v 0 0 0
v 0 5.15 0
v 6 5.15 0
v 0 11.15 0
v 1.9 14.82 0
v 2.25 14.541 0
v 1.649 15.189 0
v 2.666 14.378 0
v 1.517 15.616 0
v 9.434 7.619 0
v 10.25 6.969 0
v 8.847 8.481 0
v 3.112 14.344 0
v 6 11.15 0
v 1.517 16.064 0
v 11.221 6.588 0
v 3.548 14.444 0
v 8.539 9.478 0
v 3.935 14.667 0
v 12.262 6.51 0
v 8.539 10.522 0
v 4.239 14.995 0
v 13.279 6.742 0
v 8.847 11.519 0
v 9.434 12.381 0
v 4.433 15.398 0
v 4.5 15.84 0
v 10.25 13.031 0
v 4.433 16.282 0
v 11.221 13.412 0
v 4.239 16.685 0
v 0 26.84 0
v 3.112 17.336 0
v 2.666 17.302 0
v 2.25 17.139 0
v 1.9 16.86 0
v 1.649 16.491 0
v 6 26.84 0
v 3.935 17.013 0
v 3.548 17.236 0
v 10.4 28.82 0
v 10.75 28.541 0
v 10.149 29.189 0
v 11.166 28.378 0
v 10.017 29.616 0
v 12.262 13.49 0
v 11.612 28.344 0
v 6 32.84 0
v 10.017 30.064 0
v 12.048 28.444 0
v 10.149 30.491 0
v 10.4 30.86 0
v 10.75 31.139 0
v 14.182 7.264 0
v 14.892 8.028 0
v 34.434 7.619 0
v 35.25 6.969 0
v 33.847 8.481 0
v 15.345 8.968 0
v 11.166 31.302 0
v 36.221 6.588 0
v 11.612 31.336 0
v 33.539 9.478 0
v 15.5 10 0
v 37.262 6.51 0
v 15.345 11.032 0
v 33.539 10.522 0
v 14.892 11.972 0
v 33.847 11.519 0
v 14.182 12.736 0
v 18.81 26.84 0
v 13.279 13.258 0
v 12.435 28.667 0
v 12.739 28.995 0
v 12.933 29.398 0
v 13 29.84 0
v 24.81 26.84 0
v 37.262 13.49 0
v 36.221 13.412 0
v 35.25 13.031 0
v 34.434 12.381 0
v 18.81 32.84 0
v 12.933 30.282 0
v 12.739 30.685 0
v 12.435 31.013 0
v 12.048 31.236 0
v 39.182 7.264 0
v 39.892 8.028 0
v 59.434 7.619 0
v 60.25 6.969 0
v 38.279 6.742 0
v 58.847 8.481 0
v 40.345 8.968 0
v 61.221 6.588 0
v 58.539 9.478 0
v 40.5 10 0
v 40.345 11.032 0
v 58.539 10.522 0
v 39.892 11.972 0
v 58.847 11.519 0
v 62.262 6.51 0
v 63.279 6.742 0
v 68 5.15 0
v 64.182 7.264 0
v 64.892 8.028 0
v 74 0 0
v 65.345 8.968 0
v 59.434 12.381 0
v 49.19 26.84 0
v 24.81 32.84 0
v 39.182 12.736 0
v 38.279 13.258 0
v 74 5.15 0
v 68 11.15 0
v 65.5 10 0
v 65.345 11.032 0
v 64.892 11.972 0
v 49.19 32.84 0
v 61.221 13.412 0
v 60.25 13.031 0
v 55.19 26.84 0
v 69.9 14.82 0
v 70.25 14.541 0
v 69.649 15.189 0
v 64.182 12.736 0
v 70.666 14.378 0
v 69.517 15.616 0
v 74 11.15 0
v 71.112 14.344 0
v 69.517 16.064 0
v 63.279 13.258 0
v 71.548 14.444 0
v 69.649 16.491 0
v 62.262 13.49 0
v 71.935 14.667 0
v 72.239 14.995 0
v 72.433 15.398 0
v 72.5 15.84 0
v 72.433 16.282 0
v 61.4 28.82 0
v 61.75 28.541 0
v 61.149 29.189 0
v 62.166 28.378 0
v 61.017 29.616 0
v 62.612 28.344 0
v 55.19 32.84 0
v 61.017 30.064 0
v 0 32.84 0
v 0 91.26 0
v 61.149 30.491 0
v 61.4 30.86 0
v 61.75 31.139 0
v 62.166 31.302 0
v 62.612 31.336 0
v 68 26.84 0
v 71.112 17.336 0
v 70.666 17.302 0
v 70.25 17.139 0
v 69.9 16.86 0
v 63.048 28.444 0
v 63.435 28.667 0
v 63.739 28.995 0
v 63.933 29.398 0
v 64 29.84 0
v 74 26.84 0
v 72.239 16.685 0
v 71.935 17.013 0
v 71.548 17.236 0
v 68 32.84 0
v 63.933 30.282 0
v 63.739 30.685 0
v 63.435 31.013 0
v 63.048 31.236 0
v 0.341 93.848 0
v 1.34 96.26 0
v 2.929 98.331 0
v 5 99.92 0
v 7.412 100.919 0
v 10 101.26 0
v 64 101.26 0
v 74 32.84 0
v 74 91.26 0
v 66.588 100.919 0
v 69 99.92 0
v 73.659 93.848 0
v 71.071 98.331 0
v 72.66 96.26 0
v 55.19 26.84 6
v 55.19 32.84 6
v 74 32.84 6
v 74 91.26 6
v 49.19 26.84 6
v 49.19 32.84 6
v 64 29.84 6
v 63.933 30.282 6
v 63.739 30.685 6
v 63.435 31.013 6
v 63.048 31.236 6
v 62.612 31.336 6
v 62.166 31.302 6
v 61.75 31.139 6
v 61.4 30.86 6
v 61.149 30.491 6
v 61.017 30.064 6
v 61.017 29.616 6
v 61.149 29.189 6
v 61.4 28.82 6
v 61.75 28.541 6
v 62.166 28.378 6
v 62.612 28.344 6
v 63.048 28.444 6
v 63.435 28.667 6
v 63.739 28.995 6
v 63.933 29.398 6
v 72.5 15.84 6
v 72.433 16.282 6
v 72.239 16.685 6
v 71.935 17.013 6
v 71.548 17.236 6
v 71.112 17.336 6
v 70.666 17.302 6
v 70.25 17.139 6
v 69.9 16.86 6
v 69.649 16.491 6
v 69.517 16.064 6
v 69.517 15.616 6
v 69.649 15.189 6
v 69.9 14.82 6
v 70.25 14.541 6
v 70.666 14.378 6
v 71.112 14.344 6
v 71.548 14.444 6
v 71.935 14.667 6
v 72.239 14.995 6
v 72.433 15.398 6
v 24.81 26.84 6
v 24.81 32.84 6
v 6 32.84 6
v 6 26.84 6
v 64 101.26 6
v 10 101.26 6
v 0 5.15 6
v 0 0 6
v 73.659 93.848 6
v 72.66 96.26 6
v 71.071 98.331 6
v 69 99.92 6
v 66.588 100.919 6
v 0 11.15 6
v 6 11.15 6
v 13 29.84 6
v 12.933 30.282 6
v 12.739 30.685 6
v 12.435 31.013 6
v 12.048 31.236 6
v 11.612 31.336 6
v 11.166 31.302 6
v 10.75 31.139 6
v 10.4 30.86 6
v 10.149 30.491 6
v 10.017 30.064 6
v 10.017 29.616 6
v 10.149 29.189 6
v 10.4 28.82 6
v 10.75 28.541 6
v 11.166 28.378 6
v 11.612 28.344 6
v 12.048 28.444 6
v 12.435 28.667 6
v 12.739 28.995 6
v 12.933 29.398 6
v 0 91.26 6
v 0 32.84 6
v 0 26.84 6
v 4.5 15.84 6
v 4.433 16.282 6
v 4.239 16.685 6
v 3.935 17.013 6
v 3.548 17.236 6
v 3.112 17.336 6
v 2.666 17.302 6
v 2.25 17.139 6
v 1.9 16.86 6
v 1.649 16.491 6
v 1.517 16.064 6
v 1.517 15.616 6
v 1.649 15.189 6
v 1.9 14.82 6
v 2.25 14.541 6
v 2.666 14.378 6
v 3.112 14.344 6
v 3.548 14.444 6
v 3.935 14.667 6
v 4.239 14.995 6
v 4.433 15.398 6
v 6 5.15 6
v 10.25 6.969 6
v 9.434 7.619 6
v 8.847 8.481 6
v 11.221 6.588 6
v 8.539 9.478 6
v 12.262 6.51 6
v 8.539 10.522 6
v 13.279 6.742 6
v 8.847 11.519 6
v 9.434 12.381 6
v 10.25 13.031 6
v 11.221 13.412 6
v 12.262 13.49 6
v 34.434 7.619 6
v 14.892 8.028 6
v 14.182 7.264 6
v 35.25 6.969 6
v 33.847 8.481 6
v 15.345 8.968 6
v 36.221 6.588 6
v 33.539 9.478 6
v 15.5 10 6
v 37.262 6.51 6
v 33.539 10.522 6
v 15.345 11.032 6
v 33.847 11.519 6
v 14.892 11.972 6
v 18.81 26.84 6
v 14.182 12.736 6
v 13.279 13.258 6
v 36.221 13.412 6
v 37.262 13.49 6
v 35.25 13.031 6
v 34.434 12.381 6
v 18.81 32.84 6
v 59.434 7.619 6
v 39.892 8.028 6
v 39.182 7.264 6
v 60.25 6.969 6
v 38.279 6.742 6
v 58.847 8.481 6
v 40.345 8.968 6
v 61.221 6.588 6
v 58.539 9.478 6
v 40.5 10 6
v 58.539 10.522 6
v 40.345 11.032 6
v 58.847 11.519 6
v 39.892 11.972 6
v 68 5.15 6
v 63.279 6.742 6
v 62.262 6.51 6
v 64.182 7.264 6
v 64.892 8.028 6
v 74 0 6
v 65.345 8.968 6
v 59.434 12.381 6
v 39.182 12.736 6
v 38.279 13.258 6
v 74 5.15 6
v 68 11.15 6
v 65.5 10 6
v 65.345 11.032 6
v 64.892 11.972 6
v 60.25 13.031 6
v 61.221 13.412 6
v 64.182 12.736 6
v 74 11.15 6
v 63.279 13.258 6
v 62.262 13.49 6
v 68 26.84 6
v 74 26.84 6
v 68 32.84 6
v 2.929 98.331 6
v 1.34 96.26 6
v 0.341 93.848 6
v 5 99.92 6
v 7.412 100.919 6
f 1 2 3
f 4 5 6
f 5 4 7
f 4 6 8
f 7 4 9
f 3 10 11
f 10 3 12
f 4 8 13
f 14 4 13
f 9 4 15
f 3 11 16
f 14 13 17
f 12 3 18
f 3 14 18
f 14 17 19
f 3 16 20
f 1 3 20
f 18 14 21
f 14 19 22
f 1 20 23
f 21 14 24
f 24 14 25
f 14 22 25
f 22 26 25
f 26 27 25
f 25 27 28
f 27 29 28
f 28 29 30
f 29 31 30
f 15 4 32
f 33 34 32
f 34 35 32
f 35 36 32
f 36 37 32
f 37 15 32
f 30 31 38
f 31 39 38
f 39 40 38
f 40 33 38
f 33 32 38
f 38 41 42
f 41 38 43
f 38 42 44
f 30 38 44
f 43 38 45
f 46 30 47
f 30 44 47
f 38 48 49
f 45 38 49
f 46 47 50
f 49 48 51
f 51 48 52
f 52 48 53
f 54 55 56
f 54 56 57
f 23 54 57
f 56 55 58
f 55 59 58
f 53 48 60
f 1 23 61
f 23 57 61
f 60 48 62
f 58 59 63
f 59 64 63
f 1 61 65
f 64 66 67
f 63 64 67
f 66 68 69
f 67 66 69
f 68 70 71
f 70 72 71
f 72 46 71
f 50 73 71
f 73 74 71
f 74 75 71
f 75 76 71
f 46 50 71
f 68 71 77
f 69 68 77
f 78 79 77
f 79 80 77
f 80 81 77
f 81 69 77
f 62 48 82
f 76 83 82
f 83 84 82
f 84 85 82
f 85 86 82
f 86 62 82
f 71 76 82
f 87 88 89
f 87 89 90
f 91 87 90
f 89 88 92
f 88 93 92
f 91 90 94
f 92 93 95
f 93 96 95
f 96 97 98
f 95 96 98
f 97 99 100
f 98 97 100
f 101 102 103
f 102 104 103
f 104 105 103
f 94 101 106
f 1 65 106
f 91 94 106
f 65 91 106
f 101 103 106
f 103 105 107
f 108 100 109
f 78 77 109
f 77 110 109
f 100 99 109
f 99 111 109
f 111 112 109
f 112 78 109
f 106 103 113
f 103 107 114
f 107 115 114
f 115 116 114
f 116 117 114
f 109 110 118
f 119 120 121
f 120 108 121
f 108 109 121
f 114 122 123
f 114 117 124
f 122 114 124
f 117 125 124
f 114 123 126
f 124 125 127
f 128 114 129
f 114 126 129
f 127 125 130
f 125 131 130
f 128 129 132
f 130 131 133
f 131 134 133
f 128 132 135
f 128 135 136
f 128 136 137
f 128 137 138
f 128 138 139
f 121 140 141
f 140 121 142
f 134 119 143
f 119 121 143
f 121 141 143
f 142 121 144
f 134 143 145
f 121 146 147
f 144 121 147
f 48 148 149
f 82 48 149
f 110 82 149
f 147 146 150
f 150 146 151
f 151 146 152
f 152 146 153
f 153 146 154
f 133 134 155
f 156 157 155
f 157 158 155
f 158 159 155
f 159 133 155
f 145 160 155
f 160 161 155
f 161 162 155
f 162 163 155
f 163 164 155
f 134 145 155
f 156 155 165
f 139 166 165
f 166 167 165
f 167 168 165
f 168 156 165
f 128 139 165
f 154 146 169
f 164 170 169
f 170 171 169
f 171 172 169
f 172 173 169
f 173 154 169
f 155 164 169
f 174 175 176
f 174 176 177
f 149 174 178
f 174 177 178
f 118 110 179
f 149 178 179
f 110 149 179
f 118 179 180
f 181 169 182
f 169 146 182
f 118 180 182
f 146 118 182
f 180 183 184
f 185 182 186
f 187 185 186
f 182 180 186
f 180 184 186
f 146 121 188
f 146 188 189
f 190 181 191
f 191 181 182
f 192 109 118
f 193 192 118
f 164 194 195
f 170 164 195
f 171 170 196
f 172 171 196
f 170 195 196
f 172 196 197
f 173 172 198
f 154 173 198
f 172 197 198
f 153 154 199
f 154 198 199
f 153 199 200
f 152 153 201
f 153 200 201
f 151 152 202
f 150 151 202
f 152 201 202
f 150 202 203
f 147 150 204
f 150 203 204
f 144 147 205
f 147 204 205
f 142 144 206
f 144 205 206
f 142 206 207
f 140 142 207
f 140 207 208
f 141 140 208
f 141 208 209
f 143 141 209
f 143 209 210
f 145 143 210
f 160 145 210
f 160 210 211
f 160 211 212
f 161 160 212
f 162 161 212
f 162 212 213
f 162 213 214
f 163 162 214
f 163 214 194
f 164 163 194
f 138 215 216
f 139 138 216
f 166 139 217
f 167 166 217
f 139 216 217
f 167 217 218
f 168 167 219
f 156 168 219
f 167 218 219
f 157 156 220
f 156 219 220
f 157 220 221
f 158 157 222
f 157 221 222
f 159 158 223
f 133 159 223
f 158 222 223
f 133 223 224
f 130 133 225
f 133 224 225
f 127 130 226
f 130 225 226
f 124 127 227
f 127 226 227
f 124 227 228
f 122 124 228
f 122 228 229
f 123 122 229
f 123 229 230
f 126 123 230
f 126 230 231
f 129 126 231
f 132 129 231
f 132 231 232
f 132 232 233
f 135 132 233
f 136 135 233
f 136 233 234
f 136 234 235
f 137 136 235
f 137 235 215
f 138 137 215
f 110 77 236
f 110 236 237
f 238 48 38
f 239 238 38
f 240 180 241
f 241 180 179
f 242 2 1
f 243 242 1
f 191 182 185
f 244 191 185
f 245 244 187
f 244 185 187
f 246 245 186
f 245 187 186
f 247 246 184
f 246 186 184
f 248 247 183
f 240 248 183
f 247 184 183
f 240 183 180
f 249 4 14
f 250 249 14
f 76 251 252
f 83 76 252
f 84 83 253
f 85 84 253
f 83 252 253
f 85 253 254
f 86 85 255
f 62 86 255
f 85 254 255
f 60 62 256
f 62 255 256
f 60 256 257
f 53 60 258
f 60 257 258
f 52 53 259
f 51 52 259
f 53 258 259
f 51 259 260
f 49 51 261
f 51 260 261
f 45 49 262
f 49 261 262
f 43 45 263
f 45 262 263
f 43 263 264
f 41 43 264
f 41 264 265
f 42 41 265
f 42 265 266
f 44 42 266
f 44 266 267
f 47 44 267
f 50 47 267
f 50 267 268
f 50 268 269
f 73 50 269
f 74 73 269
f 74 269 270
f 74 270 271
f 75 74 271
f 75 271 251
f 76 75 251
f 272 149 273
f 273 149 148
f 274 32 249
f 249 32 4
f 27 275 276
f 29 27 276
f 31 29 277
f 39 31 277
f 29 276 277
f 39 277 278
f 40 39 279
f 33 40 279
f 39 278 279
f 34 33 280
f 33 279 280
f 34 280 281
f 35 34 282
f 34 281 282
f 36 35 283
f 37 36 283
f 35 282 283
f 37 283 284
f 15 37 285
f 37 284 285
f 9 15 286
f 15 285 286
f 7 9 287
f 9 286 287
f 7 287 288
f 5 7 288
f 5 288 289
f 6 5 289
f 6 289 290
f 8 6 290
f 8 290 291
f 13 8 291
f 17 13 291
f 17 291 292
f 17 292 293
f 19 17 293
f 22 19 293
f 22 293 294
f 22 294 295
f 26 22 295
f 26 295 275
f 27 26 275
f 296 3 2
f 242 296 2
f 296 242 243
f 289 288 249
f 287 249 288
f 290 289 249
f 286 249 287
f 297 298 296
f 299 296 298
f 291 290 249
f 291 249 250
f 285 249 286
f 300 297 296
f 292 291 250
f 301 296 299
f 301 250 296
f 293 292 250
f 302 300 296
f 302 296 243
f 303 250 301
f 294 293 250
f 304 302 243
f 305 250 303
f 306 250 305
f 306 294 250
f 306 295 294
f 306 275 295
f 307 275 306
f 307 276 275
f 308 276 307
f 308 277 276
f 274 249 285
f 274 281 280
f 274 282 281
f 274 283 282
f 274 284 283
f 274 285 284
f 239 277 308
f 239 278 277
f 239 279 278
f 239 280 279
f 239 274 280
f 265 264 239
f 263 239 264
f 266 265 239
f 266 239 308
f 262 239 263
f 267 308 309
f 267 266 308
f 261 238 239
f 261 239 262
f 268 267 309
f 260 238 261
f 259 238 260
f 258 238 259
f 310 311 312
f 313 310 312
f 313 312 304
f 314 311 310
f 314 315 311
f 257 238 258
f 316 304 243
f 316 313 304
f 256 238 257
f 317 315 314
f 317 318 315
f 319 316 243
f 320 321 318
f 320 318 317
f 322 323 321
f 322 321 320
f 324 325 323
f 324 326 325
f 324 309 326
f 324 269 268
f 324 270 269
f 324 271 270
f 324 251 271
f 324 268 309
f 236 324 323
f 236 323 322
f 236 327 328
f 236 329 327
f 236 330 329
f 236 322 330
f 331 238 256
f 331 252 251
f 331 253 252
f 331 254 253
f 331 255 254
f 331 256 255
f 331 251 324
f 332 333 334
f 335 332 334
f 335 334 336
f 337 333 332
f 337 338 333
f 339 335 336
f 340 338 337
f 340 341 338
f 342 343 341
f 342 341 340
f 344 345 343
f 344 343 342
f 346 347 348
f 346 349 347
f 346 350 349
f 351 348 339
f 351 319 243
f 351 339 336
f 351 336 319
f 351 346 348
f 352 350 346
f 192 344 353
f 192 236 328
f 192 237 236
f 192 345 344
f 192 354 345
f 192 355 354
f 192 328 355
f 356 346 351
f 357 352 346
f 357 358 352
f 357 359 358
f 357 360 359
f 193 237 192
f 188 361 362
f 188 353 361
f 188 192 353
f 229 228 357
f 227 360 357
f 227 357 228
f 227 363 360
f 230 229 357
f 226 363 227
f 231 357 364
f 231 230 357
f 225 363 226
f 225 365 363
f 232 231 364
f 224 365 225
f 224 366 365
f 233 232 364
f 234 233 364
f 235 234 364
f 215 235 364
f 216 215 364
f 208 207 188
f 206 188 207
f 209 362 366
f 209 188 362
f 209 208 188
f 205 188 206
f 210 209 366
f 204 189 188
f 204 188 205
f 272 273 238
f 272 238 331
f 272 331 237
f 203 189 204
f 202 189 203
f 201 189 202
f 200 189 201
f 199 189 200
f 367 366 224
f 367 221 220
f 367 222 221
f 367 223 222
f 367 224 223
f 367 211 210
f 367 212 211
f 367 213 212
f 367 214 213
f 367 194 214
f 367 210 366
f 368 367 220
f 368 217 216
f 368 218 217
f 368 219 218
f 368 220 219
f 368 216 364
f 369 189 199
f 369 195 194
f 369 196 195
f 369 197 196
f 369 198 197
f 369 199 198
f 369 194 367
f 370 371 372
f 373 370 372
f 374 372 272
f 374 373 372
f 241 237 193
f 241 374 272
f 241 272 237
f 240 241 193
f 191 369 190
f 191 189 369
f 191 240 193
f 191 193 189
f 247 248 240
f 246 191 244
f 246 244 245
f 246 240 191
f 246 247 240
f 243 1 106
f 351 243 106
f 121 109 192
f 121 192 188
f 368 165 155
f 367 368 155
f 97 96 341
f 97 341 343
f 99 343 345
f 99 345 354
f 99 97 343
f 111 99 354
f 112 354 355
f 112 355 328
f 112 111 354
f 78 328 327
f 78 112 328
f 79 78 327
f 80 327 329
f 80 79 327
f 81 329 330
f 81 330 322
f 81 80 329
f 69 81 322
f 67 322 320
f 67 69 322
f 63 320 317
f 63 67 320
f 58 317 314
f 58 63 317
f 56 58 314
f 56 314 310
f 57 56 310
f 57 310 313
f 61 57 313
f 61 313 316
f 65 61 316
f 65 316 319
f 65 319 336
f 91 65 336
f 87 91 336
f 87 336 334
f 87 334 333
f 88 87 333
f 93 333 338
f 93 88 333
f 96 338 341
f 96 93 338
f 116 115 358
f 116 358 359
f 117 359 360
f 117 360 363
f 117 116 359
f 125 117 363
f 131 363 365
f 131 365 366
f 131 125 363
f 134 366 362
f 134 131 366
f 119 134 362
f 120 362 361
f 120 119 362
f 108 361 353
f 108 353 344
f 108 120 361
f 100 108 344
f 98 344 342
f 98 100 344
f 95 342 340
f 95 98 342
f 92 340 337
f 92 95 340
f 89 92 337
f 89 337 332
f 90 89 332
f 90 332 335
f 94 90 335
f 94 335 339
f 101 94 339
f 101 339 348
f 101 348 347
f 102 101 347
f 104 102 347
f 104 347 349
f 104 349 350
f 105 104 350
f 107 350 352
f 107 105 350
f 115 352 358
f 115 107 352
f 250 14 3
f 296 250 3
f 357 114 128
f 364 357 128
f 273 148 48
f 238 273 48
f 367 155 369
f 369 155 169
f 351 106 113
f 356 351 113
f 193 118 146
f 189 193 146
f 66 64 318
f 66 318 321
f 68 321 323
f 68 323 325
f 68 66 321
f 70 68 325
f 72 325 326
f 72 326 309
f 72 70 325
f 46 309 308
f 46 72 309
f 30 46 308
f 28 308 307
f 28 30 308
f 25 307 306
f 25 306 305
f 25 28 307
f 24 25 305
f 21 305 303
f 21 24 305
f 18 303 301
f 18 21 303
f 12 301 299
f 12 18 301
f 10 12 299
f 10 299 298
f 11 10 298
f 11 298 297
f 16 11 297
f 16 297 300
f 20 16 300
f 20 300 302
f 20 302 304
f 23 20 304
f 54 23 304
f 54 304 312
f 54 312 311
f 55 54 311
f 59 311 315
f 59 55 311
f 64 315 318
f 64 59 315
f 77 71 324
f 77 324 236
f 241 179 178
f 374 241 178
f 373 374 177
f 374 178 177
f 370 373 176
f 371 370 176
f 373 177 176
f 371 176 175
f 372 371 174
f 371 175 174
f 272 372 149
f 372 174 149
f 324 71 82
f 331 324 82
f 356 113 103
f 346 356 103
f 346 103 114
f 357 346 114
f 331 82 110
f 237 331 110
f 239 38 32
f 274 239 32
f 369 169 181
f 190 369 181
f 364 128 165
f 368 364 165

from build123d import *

# Parameters (mm, degrees)
SKETCH1_R           = 3.5
SKETCH1_W           = 6
SKETCH1_H           = 6
BOSS_EXTRUDE1_DEPTH = 6
CUT_EXTRUDE1_REACH  = 8
SKETCH2_R           = 1.5


with BuildPart() as part:
    # Sketch1 → Boss-Extrude1 (new body)
    with BuildSketch(Plane.XY):
        with BuildLine():
            Line((0, 5.15), (0, 0))
            Line((0, 0), (74, 0))
            Line((74, 0), (74, 5.15))
            Line((74, 5.15), (68, 5.15))
            Line((68, 5.15), (68, 11.15))
            Line((68, 11.15), (74, 11.15))
            Line((74, 11.15), (74, 26.84))
            Line((74, 26.84), (68, 26.84))
            Line((68, 26.84), (68, 32.84))
            Line((68, 32.84), (74, 32.84))
            Line((74, 32.84), (74, 91.26))
            ThreePointArc((74, 91.26), (71.071067812, 98.331067812), (64, 101.26))
            Line((64, 101.26), (10, 101.26))
            ThreePointArc((10, 101.26), (2.928932188, 98.331067812), (0, 91.26))
            Line((0, 91.26), (0, 32.84))
            Line((0, 32.84), (6, 32.84))
            Line((6, 32.84), (6, 26.84))
            Line((6, 26.84), (0, 26.84))
            Line((0, 26.84), (0, 11.15))
            Line((0, 11.15), (6, 11.15))
            Line((6, 11.15), (6, 5.15))
            Line((6, 5.15), (0, 5.15))
        make_face()
        with Locations((12, 10)):
            Circle(SKETCH1_R, mode=Mode.SUBTRACT)
        with Locations((21.81, 29.84)):
            Rectangle(SKETCH1_W, SKETCH1_H, mode=Mode.SUBTRACT)
        with Locations((37, 10)):
            Circle(SKETCH1_R, mode=Mode.SUBTRACT)
        with Locations((62, 10)):
            Circle(SKETCH1_R, mode=Mode.SUBTRACT)
        with Locations((52.19, 29.84)):
            Rectangle(SKETCH1_W, SKETCH1_H, mode=Mode.SUBTRACT)
    extrude(amount=BOSS_EXTRUDE1_DEPTH)

    # Sketch2 → Cut-Extrude1 (cut, up to next)
    with BuildSketch(Plane.XY.offset(6), mode=Mode.PRIVATE) as cut_extrude1_sk1:
        with Locations((3, 15.84)):
            Circle(SKETCH2_R)
    cut_extrude1_tool1 = extrude(cut_extrude1_sk1.sketch, amount=-CUT_EXTRUDE1_REACH, mode=Mode.PRIVATE) & part.part
    add(cut_extrude1_tool1.solids().sort_by_distance((3, 15.84, 6))[0], mode=Mode.SUBTRACT)
    # Sketch2 → Cut-Extrude1 (cut, up to next)
    with BuildSketch(Plane.XY.offset(6), mode=Mode.PRIVATE) as cut_extrude1_sk2:
        with Locations((11.5, 29.84)):
            Circle(SKETCH2_R)
    cut_extrude1_tool2 = extrude(cut_extrude1_sk2.sketch, amount=-CUT_EXTRUDE1_REACH, mode=Mode.PRIVATE) & part.part
    add(cut_extrude1_tool2.solids().sort_by_distance((11.5, 29.84, 6))[0], mode=Mode.SUBTRACT)
    # Sketch2 → Cut-Extrude1 (cut, up to next)
    with BuildSketch(Plane.XY.offset(6), mode=Mode.PRIVATE) as cut_extrude1_sk3:
        with Locations((62.5, 29.84)):
            Circle(SKETCH2_R)
    cut_extrude1_tool3 = extrude(cut_extrude1_sk3.sketch, amount=-CUT_EXTRUDE1_REACH, mode=Mode.PRIVATE) & part.part
    add(cut_extrude1_tool3.solids().sort_by_distance((62.5, 29.84, 6))[0], mode=Mode.SUBTRACT)
    # Sketch2 → Cut-Extrude1 (cut, up to next)
    with BuildSketch(Plane.XY.offset(6), mode=Mode.PRIVATE) as cut_extrude1_sk4:
        with Locations((71, 15.84)):
            Circle(SKETCH2_R)
    cut_extrude1_tool4 = extrude(cut_extrude1_sk4.sketch, amount=-CUT_EXTRUDE1_REACH, mode=Mode.PRIVATE) & part.part
    add(cut_extrude1_tool4.solids().sort_by_distance((71, 15.84, 6))[0], mode=Mode.SUBTRACT)


solid = part.part
